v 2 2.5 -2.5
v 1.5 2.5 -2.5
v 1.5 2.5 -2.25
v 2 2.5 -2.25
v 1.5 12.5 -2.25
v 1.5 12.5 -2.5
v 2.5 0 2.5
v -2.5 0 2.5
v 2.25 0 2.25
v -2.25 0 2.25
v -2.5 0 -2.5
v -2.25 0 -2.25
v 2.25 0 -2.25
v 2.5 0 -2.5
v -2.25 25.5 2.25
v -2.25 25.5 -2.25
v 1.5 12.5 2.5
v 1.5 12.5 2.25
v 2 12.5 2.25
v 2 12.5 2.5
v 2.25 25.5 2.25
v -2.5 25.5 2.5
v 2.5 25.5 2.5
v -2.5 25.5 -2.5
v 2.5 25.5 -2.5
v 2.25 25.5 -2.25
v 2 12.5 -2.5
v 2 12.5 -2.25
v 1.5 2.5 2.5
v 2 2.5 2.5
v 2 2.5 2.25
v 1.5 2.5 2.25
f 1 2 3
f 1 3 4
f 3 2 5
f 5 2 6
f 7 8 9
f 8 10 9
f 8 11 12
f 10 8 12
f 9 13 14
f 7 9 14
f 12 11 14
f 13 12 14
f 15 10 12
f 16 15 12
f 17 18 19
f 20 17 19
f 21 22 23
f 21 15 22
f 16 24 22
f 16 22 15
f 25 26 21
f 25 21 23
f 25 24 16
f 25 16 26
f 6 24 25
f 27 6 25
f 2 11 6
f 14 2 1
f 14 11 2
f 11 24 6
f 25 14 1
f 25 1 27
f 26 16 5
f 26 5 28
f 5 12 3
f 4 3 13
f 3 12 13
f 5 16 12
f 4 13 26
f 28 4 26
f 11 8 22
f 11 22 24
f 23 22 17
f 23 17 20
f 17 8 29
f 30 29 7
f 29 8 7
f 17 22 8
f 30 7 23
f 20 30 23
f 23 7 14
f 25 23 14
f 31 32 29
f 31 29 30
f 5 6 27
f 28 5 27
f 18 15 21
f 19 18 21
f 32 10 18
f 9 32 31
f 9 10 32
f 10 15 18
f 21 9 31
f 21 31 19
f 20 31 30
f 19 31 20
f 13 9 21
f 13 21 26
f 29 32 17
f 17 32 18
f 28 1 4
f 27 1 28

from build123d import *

# Parameters (mm, degrees)
SKETCH1_W               = 5
SKETCH1_H               = 5
SKETCH1_W_2             = 4.5
SKETCH1_H_2             = 4.5
BOSS_EXTRUDE1_DEPTH     = 25.5
CUT_EXTRUDE1_DEPTH      = 27.105554964
CUT_EXTRUDE1_DEPTH_BACK = 27.105554964
SKETCH2_W               = 0.5
SKETCH2_H               = 10


with BuildPart() as part:
    # Sketch1 → Boss-Extrude1 (new body)
    with BuildSketch(Plane(origin=(0, 0, 0), x_dir=(1, 0, 0), z_dir=(0, 1, 0))):
        Rectangle(SKETCH1_W, SKETCH1_H)
        Rectangle(SKETCH1_W_2, SKETCH1_H_2, mode=Mode.SUBTRACT)
    extrude(amount=BOSS_EXTRUDE1_DEPTH)

    # Sketch2 → Cut-Extrude1 (cut, two sides: drawn at the far end of the back side and taken through both)
    with BuildSketch(Plane.XY.offset(2.5).offset(-CUT_EXTRUDE1_DEPTH_BACK)):
        with Locations((1.75, 7.5)):
            Rectangle(SKETCH2_W, SKETCH2_H)
    extrude(amount=CUT_EXTRUDE1_DEPTH + CUT_EXTRUDE1_DEPTH_BACK, mode=Mode.SUBTRACT)


solid = part.part
